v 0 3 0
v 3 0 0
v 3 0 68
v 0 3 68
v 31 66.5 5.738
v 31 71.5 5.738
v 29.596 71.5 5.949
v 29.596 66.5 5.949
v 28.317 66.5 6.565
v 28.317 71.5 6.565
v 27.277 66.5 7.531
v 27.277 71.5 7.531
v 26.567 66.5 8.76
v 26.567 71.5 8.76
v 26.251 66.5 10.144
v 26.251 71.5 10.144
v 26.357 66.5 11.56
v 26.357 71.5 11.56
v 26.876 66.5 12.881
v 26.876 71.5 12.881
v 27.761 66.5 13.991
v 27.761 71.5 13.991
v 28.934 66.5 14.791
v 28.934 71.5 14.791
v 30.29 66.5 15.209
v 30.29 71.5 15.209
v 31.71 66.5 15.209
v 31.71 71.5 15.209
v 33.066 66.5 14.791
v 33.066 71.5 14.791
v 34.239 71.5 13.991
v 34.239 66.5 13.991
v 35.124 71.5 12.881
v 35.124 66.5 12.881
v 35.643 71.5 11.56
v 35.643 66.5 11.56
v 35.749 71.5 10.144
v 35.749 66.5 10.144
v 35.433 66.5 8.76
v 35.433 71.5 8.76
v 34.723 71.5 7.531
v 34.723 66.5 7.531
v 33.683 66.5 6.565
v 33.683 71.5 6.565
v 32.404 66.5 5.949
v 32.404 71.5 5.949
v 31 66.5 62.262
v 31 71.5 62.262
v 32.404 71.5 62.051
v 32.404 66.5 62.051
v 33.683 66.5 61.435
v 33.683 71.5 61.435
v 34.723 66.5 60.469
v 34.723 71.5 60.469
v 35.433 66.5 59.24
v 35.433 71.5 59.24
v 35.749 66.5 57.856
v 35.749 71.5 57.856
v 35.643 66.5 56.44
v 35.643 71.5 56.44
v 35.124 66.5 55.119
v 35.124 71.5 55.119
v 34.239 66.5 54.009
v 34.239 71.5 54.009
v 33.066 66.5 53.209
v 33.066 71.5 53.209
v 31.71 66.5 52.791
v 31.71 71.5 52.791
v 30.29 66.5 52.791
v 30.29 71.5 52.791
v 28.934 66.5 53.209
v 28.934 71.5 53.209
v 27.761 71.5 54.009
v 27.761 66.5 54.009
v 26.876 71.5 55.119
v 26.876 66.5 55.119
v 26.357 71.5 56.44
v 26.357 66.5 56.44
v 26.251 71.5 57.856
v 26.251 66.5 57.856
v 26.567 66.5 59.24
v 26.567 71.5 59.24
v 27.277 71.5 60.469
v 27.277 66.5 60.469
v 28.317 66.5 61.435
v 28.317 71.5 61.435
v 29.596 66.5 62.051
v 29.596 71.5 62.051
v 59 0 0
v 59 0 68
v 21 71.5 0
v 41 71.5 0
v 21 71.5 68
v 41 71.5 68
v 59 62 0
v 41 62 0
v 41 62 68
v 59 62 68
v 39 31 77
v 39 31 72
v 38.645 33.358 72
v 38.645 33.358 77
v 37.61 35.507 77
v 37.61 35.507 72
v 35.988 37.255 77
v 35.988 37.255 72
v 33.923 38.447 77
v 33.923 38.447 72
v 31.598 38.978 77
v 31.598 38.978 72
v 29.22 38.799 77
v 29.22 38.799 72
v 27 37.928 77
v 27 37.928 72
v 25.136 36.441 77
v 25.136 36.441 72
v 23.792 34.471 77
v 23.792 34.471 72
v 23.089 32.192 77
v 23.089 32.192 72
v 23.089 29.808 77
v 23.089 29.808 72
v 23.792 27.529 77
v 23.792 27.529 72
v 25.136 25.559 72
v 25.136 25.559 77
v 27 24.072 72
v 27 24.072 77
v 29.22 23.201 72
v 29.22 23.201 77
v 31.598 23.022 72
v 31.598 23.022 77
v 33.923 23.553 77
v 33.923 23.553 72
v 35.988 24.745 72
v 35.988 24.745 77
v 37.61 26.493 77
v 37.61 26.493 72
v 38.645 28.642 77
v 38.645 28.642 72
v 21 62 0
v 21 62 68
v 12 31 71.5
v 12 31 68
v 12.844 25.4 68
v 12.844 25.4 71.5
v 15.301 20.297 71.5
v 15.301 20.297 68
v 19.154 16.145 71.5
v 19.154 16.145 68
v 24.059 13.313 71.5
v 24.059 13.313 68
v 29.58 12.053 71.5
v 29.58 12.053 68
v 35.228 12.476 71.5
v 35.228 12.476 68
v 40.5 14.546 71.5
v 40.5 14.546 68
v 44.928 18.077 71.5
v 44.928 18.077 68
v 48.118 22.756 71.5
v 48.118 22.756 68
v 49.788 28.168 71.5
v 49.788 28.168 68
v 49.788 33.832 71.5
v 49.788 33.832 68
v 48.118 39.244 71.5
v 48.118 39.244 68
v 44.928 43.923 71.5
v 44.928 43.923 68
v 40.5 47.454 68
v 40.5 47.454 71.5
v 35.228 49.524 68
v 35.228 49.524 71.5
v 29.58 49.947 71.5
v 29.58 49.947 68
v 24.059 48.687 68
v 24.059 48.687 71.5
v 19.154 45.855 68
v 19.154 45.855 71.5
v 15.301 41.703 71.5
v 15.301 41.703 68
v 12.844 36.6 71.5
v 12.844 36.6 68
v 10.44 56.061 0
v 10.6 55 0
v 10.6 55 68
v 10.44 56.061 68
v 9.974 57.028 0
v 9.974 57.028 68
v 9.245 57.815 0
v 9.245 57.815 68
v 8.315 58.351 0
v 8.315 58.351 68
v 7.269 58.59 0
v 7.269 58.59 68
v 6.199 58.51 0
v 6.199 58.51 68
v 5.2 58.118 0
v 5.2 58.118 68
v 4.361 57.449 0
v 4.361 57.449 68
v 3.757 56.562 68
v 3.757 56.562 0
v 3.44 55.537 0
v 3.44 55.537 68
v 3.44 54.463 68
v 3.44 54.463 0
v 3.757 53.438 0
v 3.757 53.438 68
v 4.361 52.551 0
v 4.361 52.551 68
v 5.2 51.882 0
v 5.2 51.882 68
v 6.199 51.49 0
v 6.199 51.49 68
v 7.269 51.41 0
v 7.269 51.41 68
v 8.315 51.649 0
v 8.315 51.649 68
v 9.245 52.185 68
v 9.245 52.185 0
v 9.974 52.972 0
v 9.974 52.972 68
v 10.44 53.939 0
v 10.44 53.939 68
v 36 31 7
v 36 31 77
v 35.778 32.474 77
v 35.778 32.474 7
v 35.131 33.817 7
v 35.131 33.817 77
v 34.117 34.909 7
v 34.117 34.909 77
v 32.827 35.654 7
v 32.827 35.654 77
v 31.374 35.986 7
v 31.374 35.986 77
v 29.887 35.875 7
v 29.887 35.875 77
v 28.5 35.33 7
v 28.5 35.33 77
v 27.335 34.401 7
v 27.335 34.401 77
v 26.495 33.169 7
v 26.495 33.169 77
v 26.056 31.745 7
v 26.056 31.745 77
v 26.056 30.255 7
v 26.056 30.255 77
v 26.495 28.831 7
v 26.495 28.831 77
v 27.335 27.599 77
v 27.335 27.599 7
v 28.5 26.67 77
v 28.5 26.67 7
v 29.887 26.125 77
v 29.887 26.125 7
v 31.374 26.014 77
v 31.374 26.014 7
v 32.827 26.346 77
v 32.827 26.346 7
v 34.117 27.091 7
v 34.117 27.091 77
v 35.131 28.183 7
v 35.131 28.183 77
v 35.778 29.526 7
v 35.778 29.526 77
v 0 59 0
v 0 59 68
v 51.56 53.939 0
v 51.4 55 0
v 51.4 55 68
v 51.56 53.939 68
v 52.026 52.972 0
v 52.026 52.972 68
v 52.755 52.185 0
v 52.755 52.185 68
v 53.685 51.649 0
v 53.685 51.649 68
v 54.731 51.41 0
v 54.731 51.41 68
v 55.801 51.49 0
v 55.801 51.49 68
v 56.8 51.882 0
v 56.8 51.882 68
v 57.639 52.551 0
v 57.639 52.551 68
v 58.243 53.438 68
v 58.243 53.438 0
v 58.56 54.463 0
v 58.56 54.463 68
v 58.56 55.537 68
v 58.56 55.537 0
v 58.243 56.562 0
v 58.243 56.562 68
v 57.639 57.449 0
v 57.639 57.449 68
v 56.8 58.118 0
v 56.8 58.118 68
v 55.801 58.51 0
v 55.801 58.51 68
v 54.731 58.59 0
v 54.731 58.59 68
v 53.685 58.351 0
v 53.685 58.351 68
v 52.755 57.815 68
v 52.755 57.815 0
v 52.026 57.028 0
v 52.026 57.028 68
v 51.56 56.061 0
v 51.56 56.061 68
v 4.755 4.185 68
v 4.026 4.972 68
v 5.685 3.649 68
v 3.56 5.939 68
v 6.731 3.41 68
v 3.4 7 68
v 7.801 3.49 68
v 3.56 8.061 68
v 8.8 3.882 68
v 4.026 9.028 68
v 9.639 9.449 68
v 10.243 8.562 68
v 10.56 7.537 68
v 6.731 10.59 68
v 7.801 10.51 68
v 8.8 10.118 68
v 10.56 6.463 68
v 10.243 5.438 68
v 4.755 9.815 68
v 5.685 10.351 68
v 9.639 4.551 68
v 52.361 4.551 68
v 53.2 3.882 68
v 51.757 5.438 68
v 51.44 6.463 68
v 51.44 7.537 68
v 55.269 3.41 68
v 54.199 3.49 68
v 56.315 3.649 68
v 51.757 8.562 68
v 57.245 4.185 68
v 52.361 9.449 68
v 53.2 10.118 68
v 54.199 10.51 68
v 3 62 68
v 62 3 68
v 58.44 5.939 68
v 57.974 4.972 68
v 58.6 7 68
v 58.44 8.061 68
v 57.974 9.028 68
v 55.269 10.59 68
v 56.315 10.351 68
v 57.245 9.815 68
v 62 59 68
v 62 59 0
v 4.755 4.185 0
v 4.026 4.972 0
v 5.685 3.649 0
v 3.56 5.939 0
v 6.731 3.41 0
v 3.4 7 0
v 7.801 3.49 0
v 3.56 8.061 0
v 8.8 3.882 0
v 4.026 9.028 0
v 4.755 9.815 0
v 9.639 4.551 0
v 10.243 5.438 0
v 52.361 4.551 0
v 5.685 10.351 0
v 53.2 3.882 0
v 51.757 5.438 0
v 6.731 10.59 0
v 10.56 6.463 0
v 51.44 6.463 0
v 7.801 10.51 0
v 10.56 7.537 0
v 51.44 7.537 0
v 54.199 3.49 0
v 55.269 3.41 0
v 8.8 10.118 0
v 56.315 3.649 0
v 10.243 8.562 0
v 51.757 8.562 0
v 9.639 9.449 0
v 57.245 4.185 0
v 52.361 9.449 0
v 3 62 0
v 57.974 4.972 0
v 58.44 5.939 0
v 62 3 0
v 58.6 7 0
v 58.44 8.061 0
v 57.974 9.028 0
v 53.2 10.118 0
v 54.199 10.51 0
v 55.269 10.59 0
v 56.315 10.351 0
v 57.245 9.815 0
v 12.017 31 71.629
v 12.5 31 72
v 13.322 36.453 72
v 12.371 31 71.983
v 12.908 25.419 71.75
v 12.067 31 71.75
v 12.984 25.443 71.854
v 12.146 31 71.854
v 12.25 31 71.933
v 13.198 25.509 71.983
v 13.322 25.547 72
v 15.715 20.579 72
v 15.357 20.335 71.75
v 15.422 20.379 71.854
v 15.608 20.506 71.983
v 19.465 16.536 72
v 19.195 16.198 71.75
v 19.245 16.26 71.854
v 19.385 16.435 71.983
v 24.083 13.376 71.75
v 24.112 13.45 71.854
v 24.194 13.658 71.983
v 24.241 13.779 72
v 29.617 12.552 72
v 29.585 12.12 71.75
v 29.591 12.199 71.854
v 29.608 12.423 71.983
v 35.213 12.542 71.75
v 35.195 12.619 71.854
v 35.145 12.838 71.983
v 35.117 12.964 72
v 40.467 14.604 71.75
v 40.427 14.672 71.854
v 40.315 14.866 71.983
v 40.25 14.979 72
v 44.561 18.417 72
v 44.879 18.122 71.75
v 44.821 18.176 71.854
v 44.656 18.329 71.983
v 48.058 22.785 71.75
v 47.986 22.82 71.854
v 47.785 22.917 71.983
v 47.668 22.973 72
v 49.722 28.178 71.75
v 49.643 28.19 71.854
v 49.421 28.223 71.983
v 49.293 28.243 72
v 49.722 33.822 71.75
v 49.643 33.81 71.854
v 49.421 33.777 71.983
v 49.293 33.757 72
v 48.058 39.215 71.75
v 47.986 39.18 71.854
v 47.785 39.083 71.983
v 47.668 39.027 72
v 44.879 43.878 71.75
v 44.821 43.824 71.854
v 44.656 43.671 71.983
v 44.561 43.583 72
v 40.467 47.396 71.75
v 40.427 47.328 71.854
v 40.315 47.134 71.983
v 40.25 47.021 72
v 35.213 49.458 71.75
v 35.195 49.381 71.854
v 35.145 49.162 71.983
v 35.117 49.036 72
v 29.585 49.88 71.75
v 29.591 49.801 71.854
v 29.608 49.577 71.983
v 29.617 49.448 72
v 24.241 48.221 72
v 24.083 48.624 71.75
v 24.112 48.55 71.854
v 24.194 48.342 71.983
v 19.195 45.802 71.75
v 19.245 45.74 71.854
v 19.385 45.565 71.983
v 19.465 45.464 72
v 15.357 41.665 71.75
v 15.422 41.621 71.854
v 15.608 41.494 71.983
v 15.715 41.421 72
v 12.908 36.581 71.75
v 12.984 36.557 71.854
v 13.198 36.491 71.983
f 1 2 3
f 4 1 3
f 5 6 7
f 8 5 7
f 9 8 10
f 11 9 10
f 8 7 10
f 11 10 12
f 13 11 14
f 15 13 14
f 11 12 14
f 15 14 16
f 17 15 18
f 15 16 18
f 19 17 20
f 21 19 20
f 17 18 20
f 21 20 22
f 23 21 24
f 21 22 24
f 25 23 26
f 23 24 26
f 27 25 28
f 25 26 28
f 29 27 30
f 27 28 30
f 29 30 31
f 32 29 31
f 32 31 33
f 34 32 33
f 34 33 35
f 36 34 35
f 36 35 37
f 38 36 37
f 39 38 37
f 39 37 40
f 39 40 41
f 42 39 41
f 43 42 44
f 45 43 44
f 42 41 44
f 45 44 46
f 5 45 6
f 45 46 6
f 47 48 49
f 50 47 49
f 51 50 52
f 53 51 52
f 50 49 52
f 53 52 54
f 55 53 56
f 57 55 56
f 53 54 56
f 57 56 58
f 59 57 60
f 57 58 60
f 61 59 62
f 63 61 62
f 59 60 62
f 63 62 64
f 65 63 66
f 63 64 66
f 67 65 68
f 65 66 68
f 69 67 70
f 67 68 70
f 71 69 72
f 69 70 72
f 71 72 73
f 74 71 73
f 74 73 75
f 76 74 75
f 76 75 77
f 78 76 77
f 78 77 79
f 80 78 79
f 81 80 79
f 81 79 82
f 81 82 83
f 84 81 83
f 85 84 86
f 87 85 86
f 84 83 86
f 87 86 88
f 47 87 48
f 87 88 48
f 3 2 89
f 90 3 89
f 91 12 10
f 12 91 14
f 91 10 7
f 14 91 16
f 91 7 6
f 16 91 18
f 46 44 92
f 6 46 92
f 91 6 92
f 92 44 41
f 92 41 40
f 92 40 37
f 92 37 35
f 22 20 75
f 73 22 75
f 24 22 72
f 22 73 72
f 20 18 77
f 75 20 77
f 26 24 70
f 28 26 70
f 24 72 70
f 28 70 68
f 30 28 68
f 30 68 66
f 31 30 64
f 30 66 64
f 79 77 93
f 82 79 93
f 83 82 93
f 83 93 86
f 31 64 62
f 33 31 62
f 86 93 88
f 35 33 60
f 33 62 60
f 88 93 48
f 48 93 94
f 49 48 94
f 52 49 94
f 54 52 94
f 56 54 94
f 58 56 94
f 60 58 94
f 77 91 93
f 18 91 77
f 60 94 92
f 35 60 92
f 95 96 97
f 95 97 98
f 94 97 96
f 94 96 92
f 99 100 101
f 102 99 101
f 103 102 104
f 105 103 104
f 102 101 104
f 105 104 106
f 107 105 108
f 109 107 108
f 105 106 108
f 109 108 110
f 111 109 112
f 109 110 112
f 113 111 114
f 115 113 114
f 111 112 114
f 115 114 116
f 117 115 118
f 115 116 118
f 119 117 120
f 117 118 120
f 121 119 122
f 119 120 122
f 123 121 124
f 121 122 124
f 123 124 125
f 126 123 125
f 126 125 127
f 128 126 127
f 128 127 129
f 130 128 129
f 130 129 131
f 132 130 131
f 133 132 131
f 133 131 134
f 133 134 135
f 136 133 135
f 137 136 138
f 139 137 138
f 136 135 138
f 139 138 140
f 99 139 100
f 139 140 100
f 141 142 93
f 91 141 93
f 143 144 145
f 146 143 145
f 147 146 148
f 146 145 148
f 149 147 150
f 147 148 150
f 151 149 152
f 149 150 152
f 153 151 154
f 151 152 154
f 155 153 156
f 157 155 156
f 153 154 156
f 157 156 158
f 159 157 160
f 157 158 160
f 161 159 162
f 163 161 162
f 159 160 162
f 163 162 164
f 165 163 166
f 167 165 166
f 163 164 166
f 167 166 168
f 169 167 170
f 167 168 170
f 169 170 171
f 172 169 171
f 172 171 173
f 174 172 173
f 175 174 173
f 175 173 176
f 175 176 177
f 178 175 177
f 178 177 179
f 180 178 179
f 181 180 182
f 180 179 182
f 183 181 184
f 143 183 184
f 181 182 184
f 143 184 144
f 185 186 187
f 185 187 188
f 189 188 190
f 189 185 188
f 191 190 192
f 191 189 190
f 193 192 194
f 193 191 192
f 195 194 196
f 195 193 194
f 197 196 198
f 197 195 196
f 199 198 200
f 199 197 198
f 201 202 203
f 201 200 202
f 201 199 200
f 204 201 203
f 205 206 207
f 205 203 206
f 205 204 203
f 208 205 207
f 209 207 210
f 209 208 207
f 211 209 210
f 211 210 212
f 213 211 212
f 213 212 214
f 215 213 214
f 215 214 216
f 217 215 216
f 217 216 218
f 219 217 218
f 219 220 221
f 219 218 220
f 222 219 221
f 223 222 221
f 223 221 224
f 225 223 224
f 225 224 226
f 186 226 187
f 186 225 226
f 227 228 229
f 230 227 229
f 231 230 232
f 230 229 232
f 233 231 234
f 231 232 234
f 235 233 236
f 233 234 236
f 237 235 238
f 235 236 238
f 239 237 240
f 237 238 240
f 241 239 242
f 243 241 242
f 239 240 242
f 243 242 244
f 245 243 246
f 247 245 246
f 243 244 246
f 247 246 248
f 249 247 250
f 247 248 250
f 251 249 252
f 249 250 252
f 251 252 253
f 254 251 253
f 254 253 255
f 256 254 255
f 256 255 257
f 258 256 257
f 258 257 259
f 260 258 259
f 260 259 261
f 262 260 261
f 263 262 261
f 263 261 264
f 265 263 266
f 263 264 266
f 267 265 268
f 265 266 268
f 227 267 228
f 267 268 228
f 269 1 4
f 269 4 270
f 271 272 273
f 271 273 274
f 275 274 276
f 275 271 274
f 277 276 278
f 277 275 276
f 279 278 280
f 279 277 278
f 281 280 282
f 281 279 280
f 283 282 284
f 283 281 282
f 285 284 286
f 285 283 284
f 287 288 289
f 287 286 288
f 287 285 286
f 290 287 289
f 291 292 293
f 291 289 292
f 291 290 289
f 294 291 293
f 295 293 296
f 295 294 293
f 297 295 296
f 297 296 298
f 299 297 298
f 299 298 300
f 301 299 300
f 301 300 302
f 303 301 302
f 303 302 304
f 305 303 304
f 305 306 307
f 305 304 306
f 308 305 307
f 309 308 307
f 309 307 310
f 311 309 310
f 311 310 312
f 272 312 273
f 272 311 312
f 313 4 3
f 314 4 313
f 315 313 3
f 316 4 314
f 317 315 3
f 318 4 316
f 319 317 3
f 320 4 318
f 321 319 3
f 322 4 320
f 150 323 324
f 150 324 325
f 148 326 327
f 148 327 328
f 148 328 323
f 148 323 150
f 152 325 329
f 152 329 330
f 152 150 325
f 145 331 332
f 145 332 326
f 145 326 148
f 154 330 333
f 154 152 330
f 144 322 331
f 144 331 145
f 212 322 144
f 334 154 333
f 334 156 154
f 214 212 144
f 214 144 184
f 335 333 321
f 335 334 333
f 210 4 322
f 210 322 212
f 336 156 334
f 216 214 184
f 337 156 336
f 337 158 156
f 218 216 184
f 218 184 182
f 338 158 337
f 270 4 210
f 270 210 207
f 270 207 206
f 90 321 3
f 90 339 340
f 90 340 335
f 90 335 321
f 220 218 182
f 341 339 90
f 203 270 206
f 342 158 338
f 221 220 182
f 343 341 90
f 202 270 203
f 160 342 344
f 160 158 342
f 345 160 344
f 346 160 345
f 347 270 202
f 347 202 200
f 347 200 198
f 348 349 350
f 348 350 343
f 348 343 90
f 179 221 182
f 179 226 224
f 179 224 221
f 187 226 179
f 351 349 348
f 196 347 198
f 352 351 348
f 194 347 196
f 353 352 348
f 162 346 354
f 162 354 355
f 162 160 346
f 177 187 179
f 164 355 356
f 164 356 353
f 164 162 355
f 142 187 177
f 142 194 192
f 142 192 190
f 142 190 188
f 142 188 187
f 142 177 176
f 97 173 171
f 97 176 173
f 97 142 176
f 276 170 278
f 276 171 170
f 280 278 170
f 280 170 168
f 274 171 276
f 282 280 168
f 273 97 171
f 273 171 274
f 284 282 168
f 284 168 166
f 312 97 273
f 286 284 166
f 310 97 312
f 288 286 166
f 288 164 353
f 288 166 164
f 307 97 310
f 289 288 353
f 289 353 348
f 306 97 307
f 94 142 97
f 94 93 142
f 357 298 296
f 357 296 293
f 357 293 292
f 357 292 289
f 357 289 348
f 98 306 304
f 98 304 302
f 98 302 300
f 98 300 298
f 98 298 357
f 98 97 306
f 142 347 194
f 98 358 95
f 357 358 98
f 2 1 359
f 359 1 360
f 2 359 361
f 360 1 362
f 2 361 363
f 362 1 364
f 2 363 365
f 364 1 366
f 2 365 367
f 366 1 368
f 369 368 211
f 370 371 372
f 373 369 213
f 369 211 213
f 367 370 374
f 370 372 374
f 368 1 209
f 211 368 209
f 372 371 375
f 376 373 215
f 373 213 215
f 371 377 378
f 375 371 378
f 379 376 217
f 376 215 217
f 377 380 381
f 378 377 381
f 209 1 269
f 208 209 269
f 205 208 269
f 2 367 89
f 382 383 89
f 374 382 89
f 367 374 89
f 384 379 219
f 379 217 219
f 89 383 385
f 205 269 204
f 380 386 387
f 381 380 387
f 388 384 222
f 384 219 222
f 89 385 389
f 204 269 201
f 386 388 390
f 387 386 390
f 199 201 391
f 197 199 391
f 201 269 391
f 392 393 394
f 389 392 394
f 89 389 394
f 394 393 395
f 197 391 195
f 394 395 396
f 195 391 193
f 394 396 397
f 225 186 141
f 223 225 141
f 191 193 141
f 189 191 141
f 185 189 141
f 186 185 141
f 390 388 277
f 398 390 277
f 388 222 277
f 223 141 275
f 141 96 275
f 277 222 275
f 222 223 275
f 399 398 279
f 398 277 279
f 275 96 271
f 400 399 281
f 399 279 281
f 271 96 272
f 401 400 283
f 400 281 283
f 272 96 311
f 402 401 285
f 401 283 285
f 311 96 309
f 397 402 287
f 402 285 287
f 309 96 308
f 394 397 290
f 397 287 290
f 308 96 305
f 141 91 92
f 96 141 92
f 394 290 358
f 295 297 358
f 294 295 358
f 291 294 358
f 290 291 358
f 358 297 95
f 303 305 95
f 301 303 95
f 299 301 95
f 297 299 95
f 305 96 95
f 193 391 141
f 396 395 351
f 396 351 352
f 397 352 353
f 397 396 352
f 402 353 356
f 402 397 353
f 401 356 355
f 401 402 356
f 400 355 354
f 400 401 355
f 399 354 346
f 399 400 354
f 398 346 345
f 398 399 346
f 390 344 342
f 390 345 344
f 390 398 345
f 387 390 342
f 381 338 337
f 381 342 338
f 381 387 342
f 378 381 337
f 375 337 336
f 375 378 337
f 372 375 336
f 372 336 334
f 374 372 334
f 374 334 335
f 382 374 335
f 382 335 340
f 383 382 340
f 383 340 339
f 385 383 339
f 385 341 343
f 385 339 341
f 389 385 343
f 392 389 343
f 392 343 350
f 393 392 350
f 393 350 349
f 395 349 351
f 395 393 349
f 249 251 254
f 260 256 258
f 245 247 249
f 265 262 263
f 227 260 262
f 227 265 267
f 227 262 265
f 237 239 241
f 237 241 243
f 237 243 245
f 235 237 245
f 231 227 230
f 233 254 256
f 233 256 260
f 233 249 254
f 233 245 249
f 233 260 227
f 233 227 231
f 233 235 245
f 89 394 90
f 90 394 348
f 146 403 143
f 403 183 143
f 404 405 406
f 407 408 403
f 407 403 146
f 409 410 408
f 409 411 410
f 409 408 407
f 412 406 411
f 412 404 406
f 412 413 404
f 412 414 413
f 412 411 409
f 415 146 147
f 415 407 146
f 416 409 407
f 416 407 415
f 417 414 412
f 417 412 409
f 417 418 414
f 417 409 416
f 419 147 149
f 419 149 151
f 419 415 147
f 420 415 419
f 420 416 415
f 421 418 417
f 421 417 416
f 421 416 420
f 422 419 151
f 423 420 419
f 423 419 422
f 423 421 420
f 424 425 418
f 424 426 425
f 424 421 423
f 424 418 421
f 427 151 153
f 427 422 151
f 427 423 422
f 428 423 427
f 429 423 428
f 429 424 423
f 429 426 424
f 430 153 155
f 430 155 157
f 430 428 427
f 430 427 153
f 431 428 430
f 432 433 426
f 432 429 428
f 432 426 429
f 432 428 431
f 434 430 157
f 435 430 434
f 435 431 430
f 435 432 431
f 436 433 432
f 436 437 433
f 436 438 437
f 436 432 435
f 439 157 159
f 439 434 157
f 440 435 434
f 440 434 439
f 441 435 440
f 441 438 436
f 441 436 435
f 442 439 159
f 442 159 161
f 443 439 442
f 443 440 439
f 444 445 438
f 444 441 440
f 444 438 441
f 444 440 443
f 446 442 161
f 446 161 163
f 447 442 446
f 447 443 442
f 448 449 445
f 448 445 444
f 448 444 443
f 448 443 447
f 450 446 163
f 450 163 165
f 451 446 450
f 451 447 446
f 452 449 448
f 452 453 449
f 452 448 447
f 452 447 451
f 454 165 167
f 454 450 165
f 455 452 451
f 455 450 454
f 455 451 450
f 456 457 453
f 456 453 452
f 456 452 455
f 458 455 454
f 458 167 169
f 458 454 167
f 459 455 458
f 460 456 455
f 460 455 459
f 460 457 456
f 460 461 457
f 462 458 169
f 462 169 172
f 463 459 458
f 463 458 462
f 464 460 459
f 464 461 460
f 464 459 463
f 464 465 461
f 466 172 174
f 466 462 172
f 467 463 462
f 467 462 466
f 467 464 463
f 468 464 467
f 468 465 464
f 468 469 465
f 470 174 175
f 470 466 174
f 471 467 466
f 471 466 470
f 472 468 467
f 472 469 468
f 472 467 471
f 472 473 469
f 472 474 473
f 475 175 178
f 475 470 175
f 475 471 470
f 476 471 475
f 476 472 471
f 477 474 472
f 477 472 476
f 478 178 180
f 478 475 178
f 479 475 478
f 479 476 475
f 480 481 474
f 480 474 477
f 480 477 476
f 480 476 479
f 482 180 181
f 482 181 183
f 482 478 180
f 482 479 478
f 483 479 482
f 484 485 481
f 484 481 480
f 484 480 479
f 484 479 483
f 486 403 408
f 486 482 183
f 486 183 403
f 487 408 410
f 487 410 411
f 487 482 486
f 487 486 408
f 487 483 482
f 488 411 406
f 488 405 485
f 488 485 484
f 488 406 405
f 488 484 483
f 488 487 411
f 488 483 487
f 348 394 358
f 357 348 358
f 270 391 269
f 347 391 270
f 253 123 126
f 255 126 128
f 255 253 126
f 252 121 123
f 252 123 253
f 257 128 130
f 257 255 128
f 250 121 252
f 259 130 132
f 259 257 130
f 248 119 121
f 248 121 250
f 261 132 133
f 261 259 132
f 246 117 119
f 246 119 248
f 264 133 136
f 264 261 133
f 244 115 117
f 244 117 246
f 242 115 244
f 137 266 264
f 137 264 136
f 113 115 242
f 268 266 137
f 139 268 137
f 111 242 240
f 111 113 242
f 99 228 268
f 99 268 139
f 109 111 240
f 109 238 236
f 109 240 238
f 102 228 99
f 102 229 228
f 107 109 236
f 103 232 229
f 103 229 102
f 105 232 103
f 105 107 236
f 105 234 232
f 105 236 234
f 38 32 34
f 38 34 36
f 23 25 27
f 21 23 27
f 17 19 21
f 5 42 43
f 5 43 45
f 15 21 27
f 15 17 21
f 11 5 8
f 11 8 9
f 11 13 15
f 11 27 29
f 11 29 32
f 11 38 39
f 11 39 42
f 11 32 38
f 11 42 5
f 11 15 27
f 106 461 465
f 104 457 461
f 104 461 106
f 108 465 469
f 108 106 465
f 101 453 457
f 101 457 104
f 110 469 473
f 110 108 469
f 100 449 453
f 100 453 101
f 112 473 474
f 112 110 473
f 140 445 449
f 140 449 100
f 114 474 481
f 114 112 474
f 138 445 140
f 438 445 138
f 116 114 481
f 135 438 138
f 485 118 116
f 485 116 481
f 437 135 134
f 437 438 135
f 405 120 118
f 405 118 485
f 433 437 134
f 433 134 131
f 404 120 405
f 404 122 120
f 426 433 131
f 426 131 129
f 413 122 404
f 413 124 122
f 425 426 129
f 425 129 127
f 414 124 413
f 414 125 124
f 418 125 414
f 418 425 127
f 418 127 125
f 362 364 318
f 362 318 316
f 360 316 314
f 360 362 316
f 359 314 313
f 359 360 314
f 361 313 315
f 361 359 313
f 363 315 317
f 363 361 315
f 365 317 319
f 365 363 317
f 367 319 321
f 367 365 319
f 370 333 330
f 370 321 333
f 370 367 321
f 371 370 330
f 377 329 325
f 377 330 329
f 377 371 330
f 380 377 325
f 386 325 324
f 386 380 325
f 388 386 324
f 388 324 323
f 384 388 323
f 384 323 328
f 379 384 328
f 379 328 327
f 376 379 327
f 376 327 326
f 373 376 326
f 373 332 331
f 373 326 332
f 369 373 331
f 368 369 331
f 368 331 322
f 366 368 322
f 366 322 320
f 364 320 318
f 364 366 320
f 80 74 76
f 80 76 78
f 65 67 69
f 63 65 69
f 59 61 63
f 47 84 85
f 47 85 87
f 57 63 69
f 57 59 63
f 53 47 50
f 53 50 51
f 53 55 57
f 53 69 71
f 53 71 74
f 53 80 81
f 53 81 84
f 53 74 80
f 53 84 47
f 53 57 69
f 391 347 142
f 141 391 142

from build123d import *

# Parameters (mm, degrees)
ESQUISSE1_W                  = 62
ESQUISSE1_H                  = 62
BOSS_EXTRU_1_DEPTH           = 68
ESQUISSE2_R                  = 19
BOSS_EXTRU_2_DEPTH           = 4
ESQUISSE3_R                  = 8
BOSS_EXTRU_3_DEPTH           = 5
ENL_V_MAT_EXTRU_1_DEPTH      = 111.959452053
ENL_V_MAT_EXTRU_1_DEPTH_BACK = 111.959452053
ESQUISSE4_R                  = 3.6
CHANFREIN1_SIZE              = 3
ESQUISSE5_W                  = 20
ESQUISSE5_H                  = 9.5
BOSS_EXTRU_4_DEPTH           = 68
ESQUISSE6_R                  = 4.7625
ENL_V_MAT_EXTRU_2_DEPTH      = 5
ESQUISSE7_R                  = 5
ENL_V_MAT_EXTRU_3_DEPTH      = 70
CONG_1_R                     = 0.5


with BuildPart() as part:
    # Esquisse1 → Boss.-Extru.1 (new body)
    with BuildSketch(Plane.XY):
        with Locations((31, 31)):
            Rectangle(ESQUISSE1_W, ESQUISSE1_H)
    extrude(amount=BOSS_EXTRU_1_DEPTH)

    # Esquisse2 → Boss.-Extru.2 (add)
    with BuildSketch(Plane.XY.offset(68)):
        with Locations(Location((31, 31, 0), (0, 0, 180))):
            Circle(ESQUISSE2_R)
    extrude(amount=BOSS_EXTRU_2_DEPTH)

    # Esquisse3 → Boss.-Extru.3 (add)
    with BuildSketch(Plane.XY.offset(72)):
        with Locations((31, 31)):
            Circle(ESQUISSE3_R)
    extrude(amount=BOSS_EXTRU_3_DEPTH)

    # Esquisse4 → Enlèv. mat.-Extru.1 (cut, two sides: drawn at the far end of the back side and taken through both)
    with BuildSketch(Plane.XY.offset(68).offset(-ENL_V_MAT_EXTRU_1_DEPTH_BACK)):
        with Locations((7, 55)):
            Circle(ESQUISSE4_R)
        with Locations(Location((55, 55, 0), (0, 0, 180))):
            Circle(ESQUISSE4_R)
        with Locations((55, 7)):
            Circle(ESQUISSE4_R)
        with Locations(Location((7, 7, 0), (0, 0, 180))):
            Circle(ESQUISSE4_R)
    extrude(amount=ENL_V_MAT_EXTRU_1_DEPTH + ENL_V_MAT_EXTRU_1_DEPTH_BACK, mode=Mode.SUBTRACT)

    # Chanfrein1
    chanfrein1_edges = [part.edges().sort_by_distance(p)[0] for p in [
        (0, 62, 34),
        (62, 62, 34),
        (62, 0, 34),
        (0, 0, 34),
    ]]
    chamfer(chanfrein1_edges, length=CHANFREIN1_SIZE)

    # Esquisse5 → Boss.-Extru.4 (add)
    with BuildSketch(Plane.XY.offset(68)):
        with Locations((31, 66.75)):
            Rectangle(ESQUISSE5_W, ESQUISSE5_H)
    extrude(amount=-BOSS_EXTRU_4_DEPTH)

    # Esquisse6 → Enlèv. mat.-Extru.2 (cut)
    with BuildSketch(Plane(origin=(0, 71.5, 0), x_dir=(1, 0, 0), z_dir=(0, 1, 0))):
        with Locations(Location((31, -57.5, 0), (0, 0, 270))):
            Circle(ESQUISSE6_R)
        with Locations(Location((31, -10.5, 0), (0, 0, 90))):
            Circle(ESQUISSE6_R)
    extrude(amount=-ENL_V_MAT_EXTRU_2_DEPTH, mode=Mode.SUBTRACT)

    # Esquisse7 → Enlèv. mat.-Extru.3 (cut)
    with BuildSketch(Plane.XY.offset(77)):
        with Locations((31, 31)):
            Circle(ESQUISSE7_R)
    extrude(amount=-ENL_V_MAT_EXTRU_3_DEPTH, mode=Mode.SUBTRACT)

    # Congé1
    cong_1_edges = [part.edges().sort_by_distance(p)[0] for p in [
        (50, 31, 72),
    ]]
    fillet(cong_1_edges, radius=CONG_1_R)


solid = part.part
